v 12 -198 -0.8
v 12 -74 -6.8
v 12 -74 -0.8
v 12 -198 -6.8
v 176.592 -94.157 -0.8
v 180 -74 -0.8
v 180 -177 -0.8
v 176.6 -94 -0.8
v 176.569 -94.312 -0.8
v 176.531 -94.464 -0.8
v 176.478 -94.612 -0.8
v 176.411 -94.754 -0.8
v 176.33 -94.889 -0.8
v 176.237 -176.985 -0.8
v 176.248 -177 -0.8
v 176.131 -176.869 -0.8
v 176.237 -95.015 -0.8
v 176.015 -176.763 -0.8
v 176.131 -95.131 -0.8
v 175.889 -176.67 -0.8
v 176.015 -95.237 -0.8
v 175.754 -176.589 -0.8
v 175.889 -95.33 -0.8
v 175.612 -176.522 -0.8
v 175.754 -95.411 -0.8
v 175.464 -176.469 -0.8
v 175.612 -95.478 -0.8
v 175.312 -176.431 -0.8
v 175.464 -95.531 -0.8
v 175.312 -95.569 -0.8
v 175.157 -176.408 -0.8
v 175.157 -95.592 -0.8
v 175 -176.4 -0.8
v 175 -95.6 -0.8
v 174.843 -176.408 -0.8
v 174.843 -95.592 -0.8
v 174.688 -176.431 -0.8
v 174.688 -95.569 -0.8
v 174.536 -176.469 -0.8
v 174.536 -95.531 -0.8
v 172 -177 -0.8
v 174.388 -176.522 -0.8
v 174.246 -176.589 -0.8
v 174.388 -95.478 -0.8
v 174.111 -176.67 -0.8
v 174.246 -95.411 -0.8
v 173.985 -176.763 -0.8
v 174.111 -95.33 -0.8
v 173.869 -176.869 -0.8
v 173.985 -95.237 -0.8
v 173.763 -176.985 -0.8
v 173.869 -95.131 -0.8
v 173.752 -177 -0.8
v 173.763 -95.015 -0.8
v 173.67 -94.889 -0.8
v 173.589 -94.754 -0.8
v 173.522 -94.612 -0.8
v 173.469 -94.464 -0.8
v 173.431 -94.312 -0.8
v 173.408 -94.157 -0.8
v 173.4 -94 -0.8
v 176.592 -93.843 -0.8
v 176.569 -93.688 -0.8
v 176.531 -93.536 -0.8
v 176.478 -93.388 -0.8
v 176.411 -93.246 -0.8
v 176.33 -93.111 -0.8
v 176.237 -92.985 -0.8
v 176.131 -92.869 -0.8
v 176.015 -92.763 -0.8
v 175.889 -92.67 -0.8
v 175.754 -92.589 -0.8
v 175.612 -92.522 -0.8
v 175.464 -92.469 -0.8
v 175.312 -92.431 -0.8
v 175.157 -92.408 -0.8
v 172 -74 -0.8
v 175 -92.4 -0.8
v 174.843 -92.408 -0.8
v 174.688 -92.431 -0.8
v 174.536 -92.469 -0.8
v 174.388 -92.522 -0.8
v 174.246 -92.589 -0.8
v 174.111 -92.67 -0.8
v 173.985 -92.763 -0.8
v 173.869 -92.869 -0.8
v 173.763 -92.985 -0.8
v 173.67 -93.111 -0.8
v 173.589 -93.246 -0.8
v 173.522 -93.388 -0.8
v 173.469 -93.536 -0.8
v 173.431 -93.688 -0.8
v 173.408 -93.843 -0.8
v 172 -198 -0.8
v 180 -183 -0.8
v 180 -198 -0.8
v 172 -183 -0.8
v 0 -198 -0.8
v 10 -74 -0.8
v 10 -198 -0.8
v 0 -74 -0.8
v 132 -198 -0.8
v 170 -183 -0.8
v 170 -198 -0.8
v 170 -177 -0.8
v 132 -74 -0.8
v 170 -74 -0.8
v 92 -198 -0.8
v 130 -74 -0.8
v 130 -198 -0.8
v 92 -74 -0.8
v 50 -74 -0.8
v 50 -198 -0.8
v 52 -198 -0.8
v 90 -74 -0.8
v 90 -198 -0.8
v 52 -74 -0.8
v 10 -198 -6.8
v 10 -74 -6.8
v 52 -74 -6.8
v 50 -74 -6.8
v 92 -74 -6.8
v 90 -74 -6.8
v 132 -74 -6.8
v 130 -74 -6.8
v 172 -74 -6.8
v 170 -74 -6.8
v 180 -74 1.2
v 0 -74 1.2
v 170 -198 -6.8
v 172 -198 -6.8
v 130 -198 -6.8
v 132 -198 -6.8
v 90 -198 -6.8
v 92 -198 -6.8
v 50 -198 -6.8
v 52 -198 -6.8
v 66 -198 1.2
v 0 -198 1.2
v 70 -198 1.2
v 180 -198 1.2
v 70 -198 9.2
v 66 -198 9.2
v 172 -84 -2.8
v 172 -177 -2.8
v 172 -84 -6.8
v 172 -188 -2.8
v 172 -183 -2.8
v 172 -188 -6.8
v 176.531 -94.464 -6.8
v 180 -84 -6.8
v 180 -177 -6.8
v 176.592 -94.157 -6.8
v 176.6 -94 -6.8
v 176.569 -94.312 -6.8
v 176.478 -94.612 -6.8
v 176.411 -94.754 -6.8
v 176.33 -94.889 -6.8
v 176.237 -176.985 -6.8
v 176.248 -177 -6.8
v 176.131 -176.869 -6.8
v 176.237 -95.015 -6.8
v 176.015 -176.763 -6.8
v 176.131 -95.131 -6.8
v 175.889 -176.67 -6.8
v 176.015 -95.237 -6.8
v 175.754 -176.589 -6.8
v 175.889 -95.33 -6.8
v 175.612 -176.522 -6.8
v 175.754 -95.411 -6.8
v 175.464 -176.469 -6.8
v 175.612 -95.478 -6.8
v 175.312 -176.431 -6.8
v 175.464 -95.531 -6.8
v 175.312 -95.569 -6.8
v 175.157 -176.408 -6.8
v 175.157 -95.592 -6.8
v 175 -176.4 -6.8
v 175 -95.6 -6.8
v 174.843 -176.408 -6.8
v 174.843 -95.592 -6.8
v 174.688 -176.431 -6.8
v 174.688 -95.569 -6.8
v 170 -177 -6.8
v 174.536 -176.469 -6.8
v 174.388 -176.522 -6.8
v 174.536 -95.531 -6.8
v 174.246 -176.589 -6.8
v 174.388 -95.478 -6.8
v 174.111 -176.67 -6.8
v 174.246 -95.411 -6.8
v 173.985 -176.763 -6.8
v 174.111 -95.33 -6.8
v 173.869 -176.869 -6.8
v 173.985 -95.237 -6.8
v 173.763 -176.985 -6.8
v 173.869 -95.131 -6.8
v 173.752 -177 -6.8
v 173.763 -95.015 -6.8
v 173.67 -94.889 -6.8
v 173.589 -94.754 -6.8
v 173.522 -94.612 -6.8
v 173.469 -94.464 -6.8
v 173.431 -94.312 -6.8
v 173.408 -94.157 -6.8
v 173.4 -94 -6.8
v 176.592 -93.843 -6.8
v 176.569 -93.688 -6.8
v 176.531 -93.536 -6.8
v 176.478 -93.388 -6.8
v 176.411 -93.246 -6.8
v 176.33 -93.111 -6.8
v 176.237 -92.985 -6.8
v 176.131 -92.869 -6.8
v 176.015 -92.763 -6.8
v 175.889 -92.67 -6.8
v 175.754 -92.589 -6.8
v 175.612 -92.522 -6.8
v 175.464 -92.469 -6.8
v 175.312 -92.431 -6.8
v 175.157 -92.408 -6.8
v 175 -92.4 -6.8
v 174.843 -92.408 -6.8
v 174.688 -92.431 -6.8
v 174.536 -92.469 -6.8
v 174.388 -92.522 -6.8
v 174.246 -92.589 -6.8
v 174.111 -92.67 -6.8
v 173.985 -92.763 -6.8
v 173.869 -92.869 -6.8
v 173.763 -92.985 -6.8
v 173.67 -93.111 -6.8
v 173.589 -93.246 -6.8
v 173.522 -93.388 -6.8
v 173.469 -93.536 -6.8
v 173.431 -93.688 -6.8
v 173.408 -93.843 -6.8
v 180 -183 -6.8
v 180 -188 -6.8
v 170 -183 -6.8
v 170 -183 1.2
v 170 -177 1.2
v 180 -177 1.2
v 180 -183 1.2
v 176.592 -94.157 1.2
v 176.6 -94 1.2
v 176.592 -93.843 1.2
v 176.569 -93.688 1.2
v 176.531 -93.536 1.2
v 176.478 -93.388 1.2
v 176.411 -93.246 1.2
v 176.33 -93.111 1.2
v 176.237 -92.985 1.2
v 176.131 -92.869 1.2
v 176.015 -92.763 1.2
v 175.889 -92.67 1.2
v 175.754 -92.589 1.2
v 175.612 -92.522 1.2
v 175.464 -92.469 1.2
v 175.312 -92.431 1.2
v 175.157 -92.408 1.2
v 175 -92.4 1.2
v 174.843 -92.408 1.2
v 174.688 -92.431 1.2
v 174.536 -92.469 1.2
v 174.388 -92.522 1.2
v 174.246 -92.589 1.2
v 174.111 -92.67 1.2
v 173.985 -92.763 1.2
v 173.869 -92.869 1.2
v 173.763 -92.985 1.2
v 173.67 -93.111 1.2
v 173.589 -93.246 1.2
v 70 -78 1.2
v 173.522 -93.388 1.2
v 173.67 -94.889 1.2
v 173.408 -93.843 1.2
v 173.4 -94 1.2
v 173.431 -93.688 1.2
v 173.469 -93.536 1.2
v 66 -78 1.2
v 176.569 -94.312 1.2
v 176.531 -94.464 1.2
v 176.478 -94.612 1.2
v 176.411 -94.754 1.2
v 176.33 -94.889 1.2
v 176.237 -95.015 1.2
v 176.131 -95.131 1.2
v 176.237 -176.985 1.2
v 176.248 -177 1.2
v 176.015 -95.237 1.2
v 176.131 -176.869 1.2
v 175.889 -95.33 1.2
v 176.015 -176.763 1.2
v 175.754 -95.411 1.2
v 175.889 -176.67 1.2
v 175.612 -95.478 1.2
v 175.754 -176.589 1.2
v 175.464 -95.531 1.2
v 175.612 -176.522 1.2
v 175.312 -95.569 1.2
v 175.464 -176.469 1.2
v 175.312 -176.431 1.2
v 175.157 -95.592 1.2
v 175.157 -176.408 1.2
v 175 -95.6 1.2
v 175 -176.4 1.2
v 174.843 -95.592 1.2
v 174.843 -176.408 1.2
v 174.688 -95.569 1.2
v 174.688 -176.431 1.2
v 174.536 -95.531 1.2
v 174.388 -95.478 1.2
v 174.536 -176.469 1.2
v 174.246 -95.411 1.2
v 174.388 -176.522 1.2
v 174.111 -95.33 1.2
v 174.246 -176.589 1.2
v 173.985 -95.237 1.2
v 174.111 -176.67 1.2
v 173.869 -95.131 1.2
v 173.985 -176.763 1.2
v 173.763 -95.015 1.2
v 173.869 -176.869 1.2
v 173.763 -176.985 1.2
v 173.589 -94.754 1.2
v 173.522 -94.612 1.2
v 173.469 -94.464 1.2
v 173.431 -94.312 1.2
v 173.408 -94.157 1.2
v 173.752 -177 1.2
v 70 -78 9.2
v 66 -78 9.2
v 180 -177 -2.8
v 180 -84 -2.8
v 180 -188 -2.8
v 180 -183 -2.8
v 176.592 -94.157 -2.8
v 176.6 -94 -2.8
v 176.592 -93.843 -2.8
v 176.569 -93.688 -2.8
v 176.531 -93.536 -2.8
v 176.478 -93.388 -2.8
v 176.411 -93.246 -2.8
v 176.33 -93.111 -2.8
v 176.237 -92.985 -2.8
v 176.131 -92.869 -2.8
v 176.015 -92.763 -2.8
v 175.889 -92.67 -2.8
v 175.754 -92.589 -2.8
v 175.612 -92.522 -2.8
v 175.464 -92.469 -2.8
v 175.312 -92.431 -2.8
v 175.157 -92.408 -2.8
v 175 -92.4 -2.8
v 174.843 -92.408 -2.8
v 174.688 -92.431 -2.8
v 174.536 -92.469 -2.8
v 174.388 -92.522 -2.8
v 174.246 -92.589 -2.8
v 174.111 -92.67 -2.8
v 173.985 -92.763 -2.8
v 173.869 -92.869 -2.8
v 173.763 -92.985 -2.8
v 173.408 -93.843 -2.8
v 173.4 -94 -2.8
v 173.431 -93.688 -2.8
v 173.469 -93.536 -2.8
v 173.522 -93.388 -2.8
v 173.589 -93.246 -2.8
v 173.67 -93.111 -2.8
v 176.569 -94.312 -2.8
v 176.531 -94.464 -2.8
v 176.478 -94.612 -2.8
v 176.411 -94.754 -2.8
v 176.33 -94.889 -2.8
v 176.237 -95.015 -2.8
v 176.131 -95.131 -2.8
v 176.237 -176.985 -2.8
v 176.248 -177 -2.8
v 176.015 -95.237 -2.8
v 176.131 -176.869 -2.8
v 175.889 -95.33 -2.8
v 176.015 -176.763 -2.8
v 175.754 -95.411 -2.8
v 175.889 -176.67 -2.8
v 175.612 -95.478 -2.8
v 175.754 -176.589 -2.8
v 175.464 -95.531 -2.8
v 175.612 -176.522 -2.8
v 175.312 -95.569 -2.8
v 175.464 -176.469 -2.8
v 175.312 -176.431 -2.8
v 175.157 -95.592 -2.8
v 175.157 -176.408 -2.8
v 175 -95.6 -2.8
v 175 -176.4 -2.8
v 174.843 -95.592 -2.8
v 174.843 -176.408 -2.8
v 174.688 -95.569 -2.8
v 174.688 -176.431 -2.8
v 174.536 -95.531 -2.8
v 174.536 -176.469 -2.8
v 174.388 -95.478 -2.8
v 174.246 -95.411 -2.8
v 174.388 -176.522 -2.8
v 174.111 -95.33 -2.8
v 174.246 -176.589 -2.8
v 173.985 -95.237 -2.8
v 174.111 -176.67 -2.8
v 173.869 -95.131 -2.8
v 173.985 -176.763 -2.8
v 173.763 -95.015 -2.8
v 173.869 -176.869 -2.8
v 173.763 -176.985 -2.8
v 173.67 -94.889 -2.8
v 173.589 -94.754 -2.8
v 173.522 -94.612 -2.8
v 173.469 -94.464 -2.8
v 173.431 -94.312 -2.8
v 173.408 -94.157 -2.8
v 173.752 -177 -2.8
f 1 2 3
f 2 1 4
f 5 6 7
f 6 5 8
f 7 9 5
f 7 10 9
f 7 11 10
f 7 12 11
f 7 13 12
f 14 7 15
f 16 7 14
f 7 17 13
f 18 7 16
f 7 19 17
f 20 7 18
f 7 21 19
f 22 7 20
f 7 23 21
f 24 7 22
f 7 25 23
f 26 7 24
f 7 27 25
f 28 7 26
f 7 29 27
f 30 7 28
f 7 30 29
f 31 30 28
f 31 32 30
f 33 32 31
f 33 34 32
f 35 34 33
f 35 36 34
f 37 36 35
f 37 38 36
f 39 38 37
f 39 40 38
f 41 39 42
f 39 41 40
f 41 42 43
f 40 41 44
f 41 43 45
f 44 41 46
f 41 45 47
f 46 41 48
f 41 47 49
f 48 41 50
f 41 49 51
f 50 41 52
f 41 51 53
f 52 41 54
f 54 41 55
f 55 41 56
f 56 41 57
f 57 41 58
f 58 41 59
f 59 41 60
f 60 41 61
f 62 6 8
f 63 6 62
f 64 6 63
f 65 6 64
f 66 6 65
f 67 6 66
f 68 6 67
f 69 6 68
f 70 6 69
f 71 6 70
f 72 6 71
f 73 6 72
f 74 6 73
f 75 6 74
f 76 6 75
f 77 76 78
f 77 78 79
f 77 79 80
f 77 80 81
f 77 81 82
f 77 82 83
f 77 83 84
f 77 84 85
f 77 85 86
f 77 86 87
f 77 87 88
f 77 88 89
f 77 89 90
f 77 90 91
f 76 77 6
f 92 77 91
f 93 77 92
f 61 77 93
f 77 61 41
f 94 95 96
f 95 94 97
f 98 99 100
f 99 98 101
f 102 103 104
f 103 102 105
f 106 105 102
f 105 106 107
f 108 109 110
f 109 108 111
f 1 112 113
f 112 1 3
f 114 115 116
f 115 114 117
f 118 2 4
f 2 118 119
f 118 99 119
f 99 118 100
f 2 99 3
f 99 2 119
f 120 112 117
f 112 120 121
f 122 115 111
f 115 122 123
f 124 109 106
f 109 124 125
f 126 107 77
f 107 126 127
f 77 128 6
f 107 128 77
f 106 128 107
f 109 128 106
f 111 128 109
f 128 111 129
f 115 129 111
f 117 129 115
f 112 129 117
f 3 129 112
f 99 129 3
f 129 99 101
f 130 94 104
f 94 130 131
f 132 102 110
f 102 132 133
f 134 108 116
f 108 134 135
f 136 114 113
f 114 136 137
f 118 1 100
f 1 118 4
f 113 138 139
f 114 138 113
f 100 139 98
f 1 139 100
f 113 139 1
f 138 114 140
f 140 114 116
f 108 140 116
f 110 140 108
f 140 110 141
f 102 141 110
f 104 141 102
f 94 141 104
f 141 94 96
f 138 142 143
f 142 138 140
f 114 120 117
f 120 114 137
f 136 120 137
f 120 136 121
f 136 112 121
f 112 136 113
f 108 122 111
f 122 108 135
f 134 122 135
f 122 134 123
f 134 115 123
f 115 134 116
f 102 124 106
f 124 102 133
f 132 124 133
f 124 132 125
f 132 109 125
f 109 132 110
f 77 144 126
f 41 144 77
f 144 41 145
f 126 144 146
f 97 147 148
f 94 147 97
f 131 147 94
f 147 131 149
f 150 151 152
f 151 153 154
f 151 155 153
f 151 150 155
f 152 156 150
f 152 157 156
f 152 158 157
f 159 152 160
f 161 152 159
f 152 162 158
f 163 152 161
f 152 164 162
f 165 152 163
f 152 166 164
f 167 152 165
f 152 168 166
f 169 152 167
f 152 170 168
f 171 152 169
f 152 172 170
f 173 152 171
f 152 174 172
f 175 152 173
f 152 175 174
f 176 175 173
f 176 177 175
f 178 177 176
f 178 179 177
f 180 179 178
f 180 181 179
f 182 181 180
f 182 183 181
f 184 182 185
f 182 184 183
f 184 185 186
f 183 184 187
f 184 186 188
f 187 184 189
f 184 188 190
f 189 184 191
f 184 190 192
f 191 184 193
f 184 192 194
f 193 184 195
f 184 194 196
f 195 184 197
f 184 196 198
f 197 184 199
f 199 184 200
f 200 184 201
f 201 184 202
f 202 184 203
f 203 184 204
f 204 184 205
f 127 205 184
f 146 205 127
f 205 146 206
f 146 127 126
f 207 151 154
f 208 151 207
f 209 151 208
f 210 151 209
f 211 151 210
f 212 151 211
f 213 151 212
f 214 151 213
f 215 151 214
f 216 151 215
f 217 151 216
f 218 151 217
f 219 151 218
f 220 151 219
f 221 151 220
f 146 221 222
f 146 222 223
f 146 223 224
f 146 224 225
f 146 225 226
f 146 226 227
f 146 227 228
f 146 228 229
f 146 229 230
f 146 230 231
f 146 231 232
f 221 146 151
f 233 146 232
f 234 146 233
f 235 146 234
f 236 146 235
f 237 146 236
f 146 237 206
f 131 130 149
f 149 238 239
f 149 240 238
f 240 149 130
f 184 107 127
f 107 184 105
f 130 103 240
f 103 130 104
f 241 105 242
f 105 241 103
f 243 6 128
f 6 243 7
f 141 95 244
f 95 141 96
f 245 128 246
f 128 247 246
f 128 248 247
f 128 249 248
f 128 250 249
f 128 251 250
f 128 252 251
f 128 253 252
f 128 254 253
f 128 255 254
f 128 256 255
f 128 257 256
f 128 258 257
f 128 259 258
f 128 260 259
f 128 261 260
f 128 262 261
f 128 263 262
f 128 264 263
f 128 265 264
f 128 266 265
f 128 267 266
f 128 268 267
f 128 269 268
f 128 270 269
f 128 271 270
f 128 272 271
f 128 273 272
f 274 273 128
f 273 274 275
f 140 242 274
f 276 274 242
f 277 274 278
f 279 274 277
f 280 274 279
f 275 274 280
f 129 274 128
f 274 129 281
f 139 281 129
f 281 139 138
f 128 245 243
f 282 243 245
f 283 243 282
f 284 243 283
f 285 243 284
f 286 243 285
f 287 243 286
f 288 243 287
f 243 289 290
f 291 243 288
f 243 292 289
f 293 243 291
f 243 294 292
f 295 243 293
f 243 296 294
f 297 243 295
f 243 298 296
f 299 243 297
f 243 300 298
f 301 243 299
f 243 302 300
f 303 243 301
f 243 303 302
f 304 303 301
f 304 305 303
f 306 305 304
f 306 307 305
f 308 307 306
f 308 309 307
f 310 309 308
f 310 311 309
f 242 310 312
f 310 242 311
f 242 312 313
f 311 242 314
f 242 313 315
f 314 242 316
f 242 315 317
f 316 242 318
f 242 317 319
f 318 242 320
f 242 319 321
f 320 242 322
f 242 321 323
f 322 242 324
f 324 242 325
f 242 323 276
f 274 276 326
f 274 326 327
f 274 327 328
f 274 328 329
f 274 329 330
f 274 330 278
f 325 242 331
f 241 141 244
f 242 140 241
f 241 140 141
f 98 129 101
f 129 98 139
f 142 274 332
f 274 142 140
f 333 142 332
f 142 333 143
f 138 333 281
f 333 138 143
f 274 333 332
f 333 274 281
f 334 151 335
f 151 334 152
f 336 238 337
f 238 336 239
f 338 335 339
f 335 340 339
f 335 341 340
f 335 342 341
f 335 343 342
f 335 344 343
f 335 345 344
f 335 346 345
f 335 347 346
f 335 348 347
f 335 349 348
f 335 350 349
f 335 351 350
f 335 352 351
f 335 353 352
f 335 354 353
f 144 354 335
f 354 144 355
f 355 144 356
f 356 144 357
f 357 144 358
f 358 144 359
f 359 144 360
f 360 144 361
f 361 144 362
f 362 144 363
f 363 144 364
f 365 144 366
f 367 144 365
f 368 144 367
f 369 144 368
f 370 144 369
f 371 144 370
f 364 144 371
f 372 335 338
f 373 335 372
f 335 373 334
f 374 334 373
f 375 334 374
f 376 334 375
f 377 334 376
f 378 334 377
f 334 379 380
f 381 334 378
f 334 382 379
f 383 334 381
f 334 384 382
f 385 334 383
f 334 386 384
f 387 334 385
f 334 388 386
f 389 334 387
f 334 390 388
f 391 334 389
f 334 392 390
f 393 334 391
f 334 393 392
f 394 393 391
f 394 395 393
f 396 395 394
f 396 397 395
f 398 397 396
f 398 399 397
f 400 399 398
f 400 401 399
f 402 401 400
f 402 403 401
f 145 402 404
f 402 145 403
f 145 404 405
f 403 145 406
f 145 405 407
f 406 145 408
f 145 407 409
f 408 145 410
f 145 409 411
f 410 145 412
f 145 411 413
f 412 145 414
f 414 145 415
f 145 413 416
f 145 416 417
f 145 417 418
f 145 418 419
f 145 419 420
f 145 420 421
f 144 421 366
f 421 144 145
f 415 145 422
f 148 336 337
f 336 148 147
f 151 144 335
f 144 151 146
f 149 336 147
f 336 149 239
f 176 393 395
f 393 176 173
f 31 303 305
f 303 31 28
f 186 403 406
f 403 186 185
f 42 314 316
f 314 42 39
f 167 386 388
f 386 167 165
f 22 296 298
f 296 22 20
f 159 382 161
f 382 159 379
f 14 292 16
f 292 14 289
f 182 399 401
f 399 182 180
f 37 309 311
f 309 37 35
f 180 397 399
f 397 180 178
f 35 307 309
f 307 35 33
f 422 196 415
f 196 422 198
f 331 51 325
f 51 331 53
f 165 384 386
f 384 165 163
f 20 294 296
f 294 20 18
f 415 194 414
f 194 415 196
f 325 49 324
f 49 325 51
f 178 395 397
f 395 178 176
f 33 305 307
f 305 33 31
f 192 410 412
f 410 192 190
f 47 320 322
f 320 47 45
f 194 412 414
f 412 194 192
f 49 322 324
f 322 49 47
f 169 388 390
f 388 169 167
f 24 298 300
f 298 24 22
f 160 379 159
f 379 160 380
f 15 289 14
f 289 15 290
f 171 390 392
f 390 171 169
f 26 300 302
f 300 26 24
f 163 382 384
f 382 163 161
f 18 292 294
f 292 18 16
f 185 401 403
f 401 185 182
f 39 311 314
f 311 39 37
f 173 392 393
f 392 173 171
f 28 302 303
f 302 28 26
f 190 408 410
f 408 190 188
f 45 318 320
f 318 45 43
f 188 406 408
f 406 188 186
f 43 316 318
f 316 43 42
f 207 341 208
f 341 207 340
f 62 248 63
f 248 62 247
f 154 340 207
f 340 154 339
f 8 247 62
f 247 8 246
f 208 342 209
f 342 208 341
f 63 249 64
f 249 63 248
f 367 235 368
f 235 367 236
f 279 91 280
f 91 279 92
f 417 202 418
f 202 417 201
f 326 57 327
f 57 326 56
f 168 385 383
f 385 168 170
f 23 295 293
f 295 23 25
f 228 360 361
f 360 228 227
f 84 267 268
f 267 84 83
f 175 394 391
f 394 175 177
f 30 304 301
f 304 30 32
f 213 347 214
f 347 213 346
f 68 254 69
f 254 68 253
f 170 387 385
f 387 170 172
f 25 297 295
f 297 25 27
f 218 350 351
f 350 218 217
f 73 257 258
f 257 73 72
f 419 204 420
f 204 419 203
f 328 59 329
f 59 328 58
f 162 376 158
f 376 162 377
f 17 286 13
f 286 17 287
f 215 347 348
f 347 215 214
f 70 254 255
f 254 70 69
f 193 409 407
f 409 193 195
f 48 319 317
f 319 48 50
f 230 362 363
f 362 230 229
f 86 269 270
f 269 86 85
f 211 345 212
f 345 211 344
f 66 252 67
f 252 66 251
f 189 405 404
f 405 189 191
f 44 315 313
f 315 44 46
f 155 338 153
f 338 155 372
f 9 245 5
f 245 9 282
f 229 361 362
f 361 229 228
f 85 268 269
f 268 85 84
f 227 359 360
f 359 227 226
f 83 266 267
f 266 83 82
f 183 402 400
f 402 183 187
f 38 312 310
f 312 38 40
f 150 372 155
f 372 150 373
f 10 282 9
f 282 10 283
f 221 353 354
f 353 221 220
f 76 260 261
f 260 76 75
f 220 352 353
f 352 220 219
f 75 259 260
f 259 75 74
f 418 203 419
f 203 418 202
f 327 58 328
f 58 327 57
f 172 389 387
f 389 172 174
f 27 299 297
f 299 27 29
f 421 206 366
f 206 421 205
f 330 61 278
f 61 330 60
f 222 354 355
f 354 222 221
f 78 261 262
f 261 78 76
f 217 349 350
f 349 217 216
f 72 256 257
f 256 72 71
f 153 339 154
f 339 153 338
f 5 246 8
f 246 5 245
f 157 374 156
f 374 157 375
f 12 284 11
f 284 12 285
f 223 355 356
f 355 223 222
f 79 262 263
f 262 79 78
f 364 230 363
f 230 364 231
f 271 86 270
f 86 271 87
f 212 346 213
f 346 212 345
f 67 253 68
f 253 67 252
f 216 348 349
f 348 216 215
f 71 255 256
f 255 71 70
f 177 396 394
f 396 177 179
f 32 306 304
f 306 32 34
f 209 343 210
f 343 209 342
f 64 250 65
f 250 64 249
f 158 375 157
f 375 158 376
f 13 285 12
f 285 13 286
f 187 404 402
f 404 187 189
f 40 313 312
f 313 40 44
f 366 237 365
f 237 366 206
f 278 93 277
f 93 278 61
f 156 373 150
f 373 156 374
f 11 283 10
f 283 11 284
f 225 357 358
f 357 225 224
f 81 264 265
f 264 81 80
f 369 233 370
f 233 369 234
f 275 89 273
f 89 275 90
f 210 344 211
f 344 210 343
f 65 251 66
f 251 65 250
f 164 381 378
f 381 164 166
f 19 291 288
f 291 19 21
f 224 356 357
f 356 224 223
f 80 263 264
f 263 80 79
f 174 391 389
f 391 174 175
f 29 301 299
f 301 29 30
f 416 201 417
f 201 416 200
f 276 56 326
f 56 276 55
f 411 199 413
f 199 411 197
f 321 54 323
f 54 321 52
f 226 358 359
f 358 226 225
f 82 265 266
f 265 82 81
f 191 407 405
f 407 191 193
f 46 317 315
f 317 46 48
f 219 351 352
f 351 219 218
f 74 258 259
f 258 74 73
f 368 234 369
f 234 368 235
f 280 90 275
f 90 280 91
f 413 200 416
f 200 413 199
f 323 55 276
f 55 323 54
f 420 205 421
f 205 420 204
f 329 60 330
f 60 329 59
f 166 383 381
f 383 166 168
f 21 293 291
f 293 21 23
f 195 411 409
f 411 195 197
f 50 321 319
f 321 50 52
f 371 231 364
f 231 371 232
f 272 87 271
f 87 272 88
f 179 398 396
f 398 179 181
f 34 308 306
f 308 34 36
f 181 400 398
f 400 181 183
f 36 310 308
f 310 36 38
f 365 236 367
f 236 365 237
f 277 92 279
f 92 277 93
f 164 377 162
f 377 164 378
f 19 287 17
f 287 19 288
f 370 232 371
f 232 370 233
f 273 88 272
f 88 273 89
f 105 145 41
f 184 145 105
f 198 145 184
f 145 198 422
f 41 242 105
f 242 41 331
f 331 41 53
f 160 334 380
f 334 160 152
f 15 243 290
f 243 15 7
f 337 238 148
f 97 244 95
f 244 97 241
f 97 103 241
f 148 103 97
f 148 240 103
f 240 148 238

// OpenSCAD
// file: ../fj.scad
// FreeJet FJ-2 - shared dimensions and helpers.
// Coordinates (mm): X = carriage travel (left -> right, 0 = inner face of the left plate)
//                   Y = paper travel (paper moves toward +Y, 0 = black nozzle line)
//                   Z = up (0 = paper surface on the platen)
// Every part file includes this, so changing a number here moves everything.

$fn = 64;
e = 0.01;
tol = 0.25;          // clearance for printed fits

// ---- which cartridges? (HP 63 / 302 / 123 / 803 family) ---------------------------
// "K" = black only, "CMY" = tri-colour only, "KCMY" = black + tri-colour side by side.
CARTS     = "K";
N_SLOTS   = CARTS == "KCMY" ? 2 : 1;
head_pitch = 28;                      // black-to-colour cartridge spacing in the carriage
head_span = (N_SLOTS - 1) * head_pitch;
function slot_ink(i) = CARTS == "CMY" ? "C" : (i == 0 ? "K" : "C");

// ---- frame ----------------------------------------------------------------
inner_w   = 360 + 2 * head_span;     // distance between the side plates
plate_t   = 8;
rod_d     = 8;
// rods reach through both plates plus a printed collar each side; rounded up to a length
// you can buy (400 mm for one cartridge, 500 mm for black + colour, or cut them)
rod_len   = ceil((inner_w + 2 * 8 + 2 * 8 + 8) / 100) * 100;
plate_y0  = -128;    // side plate outline in Y (includes the roll-holder ear)
plate_y1  = 84;
plate_z0  = -70;     // bottom of the feet
plate_z1  = 70;

// ---- carriage rods ------------------------------------------------------------
rail_y    = -42;
rail_lo_z = 14;
rail_hi_z = 50;
belt_y    = -60;     // axis line of the X motor pulley and idler (both vertical)
belt_z    = 32;      // height of the belt centre
belt_r    = 20*2/PI/2;          // 20T GT2 pitch radius
belt_front_y = belt_y + belt_r; // strand clamped to the carriage
belt_back_y  = belt_y - belt_r; // return strand, passes behind the carriage

// ---- paper path: ONE feed roller just behind the printhead ----------------------------
tire_od   = 22;      // feed roller outside diameter (TPU tires on printed hubs)
feed_y    = -25;     // feed roller axis: as close behind the nozzles as the carriage allows
shaft_z   = -tire_od/2;
// spring-steel leaves press the paper onto the roller (no pinch shaft). They hang from a light
// printed bar spanning the frame above the paper entry; the paper slides in under the bar.
leaf_bar_y = -70;    // bar centre line
leaf_bar_z = 3;      // underside of the bar (paper passes below)
leaf_y1   = -21;     // leaf tip, just past the top of the roller
leaf_w    = 10;      // 0.3 mm spring steel (feeler-gauge strip), cut 52 mm long
leaf_angle = 7.5;    // ledge tilt: the free leaf would end ~2 mm below the paper -> ~0.4 N
tray_y1   = -74;     // front edge of the paper tray
// platen = a printed beam of bolted segments that also braces the frame
web_y     = [-50, -8, 22, 74];   // stiffening webs under the platen (run along X)
web_t     = 4;
web_z0    = -18;                  // bottom of the webs
flange_y  = [-50, 74];            // the two outer webs bolt to the side plates
flange_z  = [-9, -16];            // M3 bolt heights in the plates (vertical slots in the flanges)
platen_y0 = -62;     // platen top surface extent (entry ramp -> tear-off edge)
platen_y1 = 84;
sensor_y  = -42;     // paper lever switch, just before the roller nip
paper_x0  = 70 + head_span;   // paper left edge (fixed guide)
paper_w   = 220;     // widest sheet
sensor_x  = paper_x0 + 14;   // paper lever switch X
tire_x    = [paper_x0+20, paper_x0+75, paper_x0+145, paper_x0+200];  // roller positions

// ---- feed drive: 20T on the motor -> 60T printed pulley on the roller, 200 mm GT2 loop ----
pulley_teeth = 60;
feed_ctr  = 58.6;                     // centre distance for a 200 mm loop with 20T/60T
feed_dir  = [-0.79, -0.62];           // motor sits below and behind the roller
feed_motor_y = feed_y + feed_ctr * feed_dir[0];
feed_motor_z = shaft_z + feed_ctr * feed_dir[1];

// ---- roll holder: keyhole slots in the side plates -------------------------------------
roll_y    = -116;    // spindle axis
roll_z    = 62;
spindle_d = 12;

// ---- cartridges (MEASURE YOURS AND ADJUST) ------------------------------------------------
cart_w    = 21;      // across the carriage travel (X)
cart_d    = 37;      // front-to-back (Y)
cart_h    = 47;
nz_back   = 12;      // nozzle line distance from the contact (back) face
head_gap  = 1.2;     // nozzle plate height above the paper
flex_w    = 22;  flex_h = 26;   // area for the contact flex (salvaged from an HP DeskJet carriage)
carr_w    = 54 + head_span;     // carriage width along X
park_x    = 33;      // black (slot 0) nozzles X when parked (capped); carriage left face at 6
function slot_x(i) = (i - (N_SLOTS - 1) / 2) * head_pitch;   // slot i vs carriage centre

// ---- service station ------------------------------------------------------------
home_x    = 30;      // slot-0 nozzle X where the home switch trips (firmware X = 0)
sled_engage = 9;     // sled travel when parked (cap pressed on the nozzles)
cap_x     = park_x + sled_engage;   // slot-0 cap centre with the sled retracted (caps at head_pitch)
wiper_x   = 56 + head_span;
spit_x    = 62 + head_span;      // firmware spit_x_um = (spit_x - home_x) * 1000

// ---- hardware -----------------------------------------------------------------
lm8uu_d = 15; lm8uu_l = 24;
b608_d = 22; b608_w = 7;
m3 = 3.2; m3_head = 6; m3_nut = 6.4;   // across flats + tolerance
m25 = 2.7;
nema_hole = 31; nema_body = 42.3; nema_boss = 22.5;

// ---- derived layout ------------------------------------------------------------------
// segment boundaries: segment 0 carries the service-station end, the rest share the width
platen_seg0_end = paper_x0 + 88 <= 160 ? paper_x0 + 88 : paper_x0 - 10;   // keep joints off the sensor
platen_rest = ceil((inner_w - platen_seg0_end) / 130);
platen_segs = 1 + platen_rest;
function platen_seg_x(s) = s == 0 ? [0, platen_seg0_end] :
    let(w = (inner_w - platen_seg0_end) / platen_rest)
    [platen_seg0_end + (s - 1) * w, s == platen_segs - 1 ? inner_w : platen_seg0_end + s * w];
// electronics tray position (bolts through the platen webs)
etray_x0  = paper_x0 + 80 + (N_SLOTS > 1 ? 15 : 0);   // keep its bolts off the platen joints
etray_bolts = [etray_x0 + 25, etray_x0 + 95];

module rod_hole(l=40, d=rod_d+tol) { cylinder(d=d, h=l, center=true); }
module m3_hole(l=40) { cylinder(d=m3, h=l, center=true); }
module m3_nut_trap(h=3) { cylinder(d=m3_nut/cos(30), h=h, $fn=6); }
module rounded_box(size, r=3) {
    hull() for (x=[r, size[0]-r], y=[r, size[1]-r]) translate([x, y, 0]) cylinder(r=r, h=size[2]);
}
module nema17_holes(l=20, slot=0) {
    for (x=[-1,1], y=[-1,1]) hull() for (s=[-slot/2, slot/2])
        translate([x*nema_hole/2, y*nema_hole/2 + s, 0]) cylinder(d=m3, h=l, center=true);
    hull() for (s=[-slot/2, slot/2]) translate([0, s, 0]) cylinder(d=nema_boss+1, h=l, center=true);
}

// ---- printed shaft collars --------------------------------------------------------
collar_od = 20; collar_w = 8;

// ---- carriage details ------------------------------------------------------------
carr_z0   = head_gap + 2.5;   // carriage walls stop above the nozzle plate
carr_z1   = 60;
cart_rest_z = 14;              // height (above cartridge bottom) of the side rest tabs; 0 = none
// main file
// Rear paper tray: PART="tray" with PIECE = 0 .. tray_pieces-1 (2 pieces for the 1-cartridge
// printer; neighbours join with two M3 screws), plus
// PART="guide": the sliding right-hand paper guide. The tray hooks onto the rear edge of the
// side plates with the bracket PART="bracket" (print 2, mirror one in the slicer).
// Sheets slide in face-up along the fixed left edge until the rollers grab them.
include <../fj.scad>
PART = "tray";
PIECE = 0;
tray_y0 = plate_y0 - 70;                          // tray_y1 (front edge) is in fj.scad
tray_z = 1.2;                                      // tray surface slightly above the paper line
tray_pieces = ceil(inner_w / 190);
function tray_x(i) = inner_w * i / tray_pieces;

module tray(xa, xb) {
    difference() {
        union() {
            translate([xa, tray_y0, tray_z - 2]) cube([xb - xa, tray_y1 - tray_y0, 2]);
            // stiffening ribs underneath
            for (x=[xa + 10 : 40 : xb - 5]) translate([x, tray_y0, tray_z - 8]) cube([2, tray_y1 - tray_y0, 6]);
            // fixed left edge guide
            if (xa < paper_x0 && xb > paper_x0) translate([paper_x0 - 4, tray_y0, tray_z]) cube([4, tray_y1 - tray_y0 - 4, 8]);
            // join tabs
            if (xb < inner_w) translate([xb - 10, tray_y0 + 10, tray_z - 8]) cube([10, tray_y1 - tray_y0 - 20, 4]);
        }
        // guide slot for the sliding right guide
        translate([paper_x0 + 100, tray_y0 + 15, -10]) cube([paper_w - 80, 6, 20]);
        if (xa > 0) for (y=[tray_y0 + 20, tray_y1 - 20]) translate([xa + 5, y, -10]) cylinder(d=m3, h=20);
        if (xb < inner_w) for (y=[tray_y0 + 20, tray_y1 - 20]) translate([xb - 5, y, -10]) cylinder(d=m3, h=20);
    }
}
module guide() {
    difference() {
        union() {
            cube([4, 50, 10]);
            translate([-12, 20, -2]) cube([16, 10, 2]);
            translate([-4, 22, -6]) cube([5.6, 6, 6]);     // runs in the slot
        }
        translate([-1, 25, -10]) cylinder(d=m3, h=20);
    }
}
module bracket() {    // bolts to a plate's rear edge holes, carries the tray edge
    difference() {
        union() {
            translate([0, plate_y0 - 2, -10]) cube([plate_t + 6, 24, 32]);
            translate([plate_t, tray_y0 + 10, tray_z - 10]) cube([6, plate_y0 - tray_y0 - 8, 8]);
        }
        translate([-1, plate_y0, -10]) cube([plate_t + 0.3, 30, 40]);
        for (z=[-6, 16]) translate([plate_t/2, plate_y0 + 10, z]) rotate([0,90,0]) cylinder(d=m3, h=40, center=true);
    }
}
module paper_tray(p) {
    if (p == "tray") for (i=[0:tray_pieces-1]) tray(tray_x(i), tray_x(i + 1));
    else if (p == "guide") guide(); else bracket();
}
if (PART == "tray") tray(tray_x(PIECE), tray_x(PIECE + 1));
else if (PART == "guide") guide();
else bracket();
